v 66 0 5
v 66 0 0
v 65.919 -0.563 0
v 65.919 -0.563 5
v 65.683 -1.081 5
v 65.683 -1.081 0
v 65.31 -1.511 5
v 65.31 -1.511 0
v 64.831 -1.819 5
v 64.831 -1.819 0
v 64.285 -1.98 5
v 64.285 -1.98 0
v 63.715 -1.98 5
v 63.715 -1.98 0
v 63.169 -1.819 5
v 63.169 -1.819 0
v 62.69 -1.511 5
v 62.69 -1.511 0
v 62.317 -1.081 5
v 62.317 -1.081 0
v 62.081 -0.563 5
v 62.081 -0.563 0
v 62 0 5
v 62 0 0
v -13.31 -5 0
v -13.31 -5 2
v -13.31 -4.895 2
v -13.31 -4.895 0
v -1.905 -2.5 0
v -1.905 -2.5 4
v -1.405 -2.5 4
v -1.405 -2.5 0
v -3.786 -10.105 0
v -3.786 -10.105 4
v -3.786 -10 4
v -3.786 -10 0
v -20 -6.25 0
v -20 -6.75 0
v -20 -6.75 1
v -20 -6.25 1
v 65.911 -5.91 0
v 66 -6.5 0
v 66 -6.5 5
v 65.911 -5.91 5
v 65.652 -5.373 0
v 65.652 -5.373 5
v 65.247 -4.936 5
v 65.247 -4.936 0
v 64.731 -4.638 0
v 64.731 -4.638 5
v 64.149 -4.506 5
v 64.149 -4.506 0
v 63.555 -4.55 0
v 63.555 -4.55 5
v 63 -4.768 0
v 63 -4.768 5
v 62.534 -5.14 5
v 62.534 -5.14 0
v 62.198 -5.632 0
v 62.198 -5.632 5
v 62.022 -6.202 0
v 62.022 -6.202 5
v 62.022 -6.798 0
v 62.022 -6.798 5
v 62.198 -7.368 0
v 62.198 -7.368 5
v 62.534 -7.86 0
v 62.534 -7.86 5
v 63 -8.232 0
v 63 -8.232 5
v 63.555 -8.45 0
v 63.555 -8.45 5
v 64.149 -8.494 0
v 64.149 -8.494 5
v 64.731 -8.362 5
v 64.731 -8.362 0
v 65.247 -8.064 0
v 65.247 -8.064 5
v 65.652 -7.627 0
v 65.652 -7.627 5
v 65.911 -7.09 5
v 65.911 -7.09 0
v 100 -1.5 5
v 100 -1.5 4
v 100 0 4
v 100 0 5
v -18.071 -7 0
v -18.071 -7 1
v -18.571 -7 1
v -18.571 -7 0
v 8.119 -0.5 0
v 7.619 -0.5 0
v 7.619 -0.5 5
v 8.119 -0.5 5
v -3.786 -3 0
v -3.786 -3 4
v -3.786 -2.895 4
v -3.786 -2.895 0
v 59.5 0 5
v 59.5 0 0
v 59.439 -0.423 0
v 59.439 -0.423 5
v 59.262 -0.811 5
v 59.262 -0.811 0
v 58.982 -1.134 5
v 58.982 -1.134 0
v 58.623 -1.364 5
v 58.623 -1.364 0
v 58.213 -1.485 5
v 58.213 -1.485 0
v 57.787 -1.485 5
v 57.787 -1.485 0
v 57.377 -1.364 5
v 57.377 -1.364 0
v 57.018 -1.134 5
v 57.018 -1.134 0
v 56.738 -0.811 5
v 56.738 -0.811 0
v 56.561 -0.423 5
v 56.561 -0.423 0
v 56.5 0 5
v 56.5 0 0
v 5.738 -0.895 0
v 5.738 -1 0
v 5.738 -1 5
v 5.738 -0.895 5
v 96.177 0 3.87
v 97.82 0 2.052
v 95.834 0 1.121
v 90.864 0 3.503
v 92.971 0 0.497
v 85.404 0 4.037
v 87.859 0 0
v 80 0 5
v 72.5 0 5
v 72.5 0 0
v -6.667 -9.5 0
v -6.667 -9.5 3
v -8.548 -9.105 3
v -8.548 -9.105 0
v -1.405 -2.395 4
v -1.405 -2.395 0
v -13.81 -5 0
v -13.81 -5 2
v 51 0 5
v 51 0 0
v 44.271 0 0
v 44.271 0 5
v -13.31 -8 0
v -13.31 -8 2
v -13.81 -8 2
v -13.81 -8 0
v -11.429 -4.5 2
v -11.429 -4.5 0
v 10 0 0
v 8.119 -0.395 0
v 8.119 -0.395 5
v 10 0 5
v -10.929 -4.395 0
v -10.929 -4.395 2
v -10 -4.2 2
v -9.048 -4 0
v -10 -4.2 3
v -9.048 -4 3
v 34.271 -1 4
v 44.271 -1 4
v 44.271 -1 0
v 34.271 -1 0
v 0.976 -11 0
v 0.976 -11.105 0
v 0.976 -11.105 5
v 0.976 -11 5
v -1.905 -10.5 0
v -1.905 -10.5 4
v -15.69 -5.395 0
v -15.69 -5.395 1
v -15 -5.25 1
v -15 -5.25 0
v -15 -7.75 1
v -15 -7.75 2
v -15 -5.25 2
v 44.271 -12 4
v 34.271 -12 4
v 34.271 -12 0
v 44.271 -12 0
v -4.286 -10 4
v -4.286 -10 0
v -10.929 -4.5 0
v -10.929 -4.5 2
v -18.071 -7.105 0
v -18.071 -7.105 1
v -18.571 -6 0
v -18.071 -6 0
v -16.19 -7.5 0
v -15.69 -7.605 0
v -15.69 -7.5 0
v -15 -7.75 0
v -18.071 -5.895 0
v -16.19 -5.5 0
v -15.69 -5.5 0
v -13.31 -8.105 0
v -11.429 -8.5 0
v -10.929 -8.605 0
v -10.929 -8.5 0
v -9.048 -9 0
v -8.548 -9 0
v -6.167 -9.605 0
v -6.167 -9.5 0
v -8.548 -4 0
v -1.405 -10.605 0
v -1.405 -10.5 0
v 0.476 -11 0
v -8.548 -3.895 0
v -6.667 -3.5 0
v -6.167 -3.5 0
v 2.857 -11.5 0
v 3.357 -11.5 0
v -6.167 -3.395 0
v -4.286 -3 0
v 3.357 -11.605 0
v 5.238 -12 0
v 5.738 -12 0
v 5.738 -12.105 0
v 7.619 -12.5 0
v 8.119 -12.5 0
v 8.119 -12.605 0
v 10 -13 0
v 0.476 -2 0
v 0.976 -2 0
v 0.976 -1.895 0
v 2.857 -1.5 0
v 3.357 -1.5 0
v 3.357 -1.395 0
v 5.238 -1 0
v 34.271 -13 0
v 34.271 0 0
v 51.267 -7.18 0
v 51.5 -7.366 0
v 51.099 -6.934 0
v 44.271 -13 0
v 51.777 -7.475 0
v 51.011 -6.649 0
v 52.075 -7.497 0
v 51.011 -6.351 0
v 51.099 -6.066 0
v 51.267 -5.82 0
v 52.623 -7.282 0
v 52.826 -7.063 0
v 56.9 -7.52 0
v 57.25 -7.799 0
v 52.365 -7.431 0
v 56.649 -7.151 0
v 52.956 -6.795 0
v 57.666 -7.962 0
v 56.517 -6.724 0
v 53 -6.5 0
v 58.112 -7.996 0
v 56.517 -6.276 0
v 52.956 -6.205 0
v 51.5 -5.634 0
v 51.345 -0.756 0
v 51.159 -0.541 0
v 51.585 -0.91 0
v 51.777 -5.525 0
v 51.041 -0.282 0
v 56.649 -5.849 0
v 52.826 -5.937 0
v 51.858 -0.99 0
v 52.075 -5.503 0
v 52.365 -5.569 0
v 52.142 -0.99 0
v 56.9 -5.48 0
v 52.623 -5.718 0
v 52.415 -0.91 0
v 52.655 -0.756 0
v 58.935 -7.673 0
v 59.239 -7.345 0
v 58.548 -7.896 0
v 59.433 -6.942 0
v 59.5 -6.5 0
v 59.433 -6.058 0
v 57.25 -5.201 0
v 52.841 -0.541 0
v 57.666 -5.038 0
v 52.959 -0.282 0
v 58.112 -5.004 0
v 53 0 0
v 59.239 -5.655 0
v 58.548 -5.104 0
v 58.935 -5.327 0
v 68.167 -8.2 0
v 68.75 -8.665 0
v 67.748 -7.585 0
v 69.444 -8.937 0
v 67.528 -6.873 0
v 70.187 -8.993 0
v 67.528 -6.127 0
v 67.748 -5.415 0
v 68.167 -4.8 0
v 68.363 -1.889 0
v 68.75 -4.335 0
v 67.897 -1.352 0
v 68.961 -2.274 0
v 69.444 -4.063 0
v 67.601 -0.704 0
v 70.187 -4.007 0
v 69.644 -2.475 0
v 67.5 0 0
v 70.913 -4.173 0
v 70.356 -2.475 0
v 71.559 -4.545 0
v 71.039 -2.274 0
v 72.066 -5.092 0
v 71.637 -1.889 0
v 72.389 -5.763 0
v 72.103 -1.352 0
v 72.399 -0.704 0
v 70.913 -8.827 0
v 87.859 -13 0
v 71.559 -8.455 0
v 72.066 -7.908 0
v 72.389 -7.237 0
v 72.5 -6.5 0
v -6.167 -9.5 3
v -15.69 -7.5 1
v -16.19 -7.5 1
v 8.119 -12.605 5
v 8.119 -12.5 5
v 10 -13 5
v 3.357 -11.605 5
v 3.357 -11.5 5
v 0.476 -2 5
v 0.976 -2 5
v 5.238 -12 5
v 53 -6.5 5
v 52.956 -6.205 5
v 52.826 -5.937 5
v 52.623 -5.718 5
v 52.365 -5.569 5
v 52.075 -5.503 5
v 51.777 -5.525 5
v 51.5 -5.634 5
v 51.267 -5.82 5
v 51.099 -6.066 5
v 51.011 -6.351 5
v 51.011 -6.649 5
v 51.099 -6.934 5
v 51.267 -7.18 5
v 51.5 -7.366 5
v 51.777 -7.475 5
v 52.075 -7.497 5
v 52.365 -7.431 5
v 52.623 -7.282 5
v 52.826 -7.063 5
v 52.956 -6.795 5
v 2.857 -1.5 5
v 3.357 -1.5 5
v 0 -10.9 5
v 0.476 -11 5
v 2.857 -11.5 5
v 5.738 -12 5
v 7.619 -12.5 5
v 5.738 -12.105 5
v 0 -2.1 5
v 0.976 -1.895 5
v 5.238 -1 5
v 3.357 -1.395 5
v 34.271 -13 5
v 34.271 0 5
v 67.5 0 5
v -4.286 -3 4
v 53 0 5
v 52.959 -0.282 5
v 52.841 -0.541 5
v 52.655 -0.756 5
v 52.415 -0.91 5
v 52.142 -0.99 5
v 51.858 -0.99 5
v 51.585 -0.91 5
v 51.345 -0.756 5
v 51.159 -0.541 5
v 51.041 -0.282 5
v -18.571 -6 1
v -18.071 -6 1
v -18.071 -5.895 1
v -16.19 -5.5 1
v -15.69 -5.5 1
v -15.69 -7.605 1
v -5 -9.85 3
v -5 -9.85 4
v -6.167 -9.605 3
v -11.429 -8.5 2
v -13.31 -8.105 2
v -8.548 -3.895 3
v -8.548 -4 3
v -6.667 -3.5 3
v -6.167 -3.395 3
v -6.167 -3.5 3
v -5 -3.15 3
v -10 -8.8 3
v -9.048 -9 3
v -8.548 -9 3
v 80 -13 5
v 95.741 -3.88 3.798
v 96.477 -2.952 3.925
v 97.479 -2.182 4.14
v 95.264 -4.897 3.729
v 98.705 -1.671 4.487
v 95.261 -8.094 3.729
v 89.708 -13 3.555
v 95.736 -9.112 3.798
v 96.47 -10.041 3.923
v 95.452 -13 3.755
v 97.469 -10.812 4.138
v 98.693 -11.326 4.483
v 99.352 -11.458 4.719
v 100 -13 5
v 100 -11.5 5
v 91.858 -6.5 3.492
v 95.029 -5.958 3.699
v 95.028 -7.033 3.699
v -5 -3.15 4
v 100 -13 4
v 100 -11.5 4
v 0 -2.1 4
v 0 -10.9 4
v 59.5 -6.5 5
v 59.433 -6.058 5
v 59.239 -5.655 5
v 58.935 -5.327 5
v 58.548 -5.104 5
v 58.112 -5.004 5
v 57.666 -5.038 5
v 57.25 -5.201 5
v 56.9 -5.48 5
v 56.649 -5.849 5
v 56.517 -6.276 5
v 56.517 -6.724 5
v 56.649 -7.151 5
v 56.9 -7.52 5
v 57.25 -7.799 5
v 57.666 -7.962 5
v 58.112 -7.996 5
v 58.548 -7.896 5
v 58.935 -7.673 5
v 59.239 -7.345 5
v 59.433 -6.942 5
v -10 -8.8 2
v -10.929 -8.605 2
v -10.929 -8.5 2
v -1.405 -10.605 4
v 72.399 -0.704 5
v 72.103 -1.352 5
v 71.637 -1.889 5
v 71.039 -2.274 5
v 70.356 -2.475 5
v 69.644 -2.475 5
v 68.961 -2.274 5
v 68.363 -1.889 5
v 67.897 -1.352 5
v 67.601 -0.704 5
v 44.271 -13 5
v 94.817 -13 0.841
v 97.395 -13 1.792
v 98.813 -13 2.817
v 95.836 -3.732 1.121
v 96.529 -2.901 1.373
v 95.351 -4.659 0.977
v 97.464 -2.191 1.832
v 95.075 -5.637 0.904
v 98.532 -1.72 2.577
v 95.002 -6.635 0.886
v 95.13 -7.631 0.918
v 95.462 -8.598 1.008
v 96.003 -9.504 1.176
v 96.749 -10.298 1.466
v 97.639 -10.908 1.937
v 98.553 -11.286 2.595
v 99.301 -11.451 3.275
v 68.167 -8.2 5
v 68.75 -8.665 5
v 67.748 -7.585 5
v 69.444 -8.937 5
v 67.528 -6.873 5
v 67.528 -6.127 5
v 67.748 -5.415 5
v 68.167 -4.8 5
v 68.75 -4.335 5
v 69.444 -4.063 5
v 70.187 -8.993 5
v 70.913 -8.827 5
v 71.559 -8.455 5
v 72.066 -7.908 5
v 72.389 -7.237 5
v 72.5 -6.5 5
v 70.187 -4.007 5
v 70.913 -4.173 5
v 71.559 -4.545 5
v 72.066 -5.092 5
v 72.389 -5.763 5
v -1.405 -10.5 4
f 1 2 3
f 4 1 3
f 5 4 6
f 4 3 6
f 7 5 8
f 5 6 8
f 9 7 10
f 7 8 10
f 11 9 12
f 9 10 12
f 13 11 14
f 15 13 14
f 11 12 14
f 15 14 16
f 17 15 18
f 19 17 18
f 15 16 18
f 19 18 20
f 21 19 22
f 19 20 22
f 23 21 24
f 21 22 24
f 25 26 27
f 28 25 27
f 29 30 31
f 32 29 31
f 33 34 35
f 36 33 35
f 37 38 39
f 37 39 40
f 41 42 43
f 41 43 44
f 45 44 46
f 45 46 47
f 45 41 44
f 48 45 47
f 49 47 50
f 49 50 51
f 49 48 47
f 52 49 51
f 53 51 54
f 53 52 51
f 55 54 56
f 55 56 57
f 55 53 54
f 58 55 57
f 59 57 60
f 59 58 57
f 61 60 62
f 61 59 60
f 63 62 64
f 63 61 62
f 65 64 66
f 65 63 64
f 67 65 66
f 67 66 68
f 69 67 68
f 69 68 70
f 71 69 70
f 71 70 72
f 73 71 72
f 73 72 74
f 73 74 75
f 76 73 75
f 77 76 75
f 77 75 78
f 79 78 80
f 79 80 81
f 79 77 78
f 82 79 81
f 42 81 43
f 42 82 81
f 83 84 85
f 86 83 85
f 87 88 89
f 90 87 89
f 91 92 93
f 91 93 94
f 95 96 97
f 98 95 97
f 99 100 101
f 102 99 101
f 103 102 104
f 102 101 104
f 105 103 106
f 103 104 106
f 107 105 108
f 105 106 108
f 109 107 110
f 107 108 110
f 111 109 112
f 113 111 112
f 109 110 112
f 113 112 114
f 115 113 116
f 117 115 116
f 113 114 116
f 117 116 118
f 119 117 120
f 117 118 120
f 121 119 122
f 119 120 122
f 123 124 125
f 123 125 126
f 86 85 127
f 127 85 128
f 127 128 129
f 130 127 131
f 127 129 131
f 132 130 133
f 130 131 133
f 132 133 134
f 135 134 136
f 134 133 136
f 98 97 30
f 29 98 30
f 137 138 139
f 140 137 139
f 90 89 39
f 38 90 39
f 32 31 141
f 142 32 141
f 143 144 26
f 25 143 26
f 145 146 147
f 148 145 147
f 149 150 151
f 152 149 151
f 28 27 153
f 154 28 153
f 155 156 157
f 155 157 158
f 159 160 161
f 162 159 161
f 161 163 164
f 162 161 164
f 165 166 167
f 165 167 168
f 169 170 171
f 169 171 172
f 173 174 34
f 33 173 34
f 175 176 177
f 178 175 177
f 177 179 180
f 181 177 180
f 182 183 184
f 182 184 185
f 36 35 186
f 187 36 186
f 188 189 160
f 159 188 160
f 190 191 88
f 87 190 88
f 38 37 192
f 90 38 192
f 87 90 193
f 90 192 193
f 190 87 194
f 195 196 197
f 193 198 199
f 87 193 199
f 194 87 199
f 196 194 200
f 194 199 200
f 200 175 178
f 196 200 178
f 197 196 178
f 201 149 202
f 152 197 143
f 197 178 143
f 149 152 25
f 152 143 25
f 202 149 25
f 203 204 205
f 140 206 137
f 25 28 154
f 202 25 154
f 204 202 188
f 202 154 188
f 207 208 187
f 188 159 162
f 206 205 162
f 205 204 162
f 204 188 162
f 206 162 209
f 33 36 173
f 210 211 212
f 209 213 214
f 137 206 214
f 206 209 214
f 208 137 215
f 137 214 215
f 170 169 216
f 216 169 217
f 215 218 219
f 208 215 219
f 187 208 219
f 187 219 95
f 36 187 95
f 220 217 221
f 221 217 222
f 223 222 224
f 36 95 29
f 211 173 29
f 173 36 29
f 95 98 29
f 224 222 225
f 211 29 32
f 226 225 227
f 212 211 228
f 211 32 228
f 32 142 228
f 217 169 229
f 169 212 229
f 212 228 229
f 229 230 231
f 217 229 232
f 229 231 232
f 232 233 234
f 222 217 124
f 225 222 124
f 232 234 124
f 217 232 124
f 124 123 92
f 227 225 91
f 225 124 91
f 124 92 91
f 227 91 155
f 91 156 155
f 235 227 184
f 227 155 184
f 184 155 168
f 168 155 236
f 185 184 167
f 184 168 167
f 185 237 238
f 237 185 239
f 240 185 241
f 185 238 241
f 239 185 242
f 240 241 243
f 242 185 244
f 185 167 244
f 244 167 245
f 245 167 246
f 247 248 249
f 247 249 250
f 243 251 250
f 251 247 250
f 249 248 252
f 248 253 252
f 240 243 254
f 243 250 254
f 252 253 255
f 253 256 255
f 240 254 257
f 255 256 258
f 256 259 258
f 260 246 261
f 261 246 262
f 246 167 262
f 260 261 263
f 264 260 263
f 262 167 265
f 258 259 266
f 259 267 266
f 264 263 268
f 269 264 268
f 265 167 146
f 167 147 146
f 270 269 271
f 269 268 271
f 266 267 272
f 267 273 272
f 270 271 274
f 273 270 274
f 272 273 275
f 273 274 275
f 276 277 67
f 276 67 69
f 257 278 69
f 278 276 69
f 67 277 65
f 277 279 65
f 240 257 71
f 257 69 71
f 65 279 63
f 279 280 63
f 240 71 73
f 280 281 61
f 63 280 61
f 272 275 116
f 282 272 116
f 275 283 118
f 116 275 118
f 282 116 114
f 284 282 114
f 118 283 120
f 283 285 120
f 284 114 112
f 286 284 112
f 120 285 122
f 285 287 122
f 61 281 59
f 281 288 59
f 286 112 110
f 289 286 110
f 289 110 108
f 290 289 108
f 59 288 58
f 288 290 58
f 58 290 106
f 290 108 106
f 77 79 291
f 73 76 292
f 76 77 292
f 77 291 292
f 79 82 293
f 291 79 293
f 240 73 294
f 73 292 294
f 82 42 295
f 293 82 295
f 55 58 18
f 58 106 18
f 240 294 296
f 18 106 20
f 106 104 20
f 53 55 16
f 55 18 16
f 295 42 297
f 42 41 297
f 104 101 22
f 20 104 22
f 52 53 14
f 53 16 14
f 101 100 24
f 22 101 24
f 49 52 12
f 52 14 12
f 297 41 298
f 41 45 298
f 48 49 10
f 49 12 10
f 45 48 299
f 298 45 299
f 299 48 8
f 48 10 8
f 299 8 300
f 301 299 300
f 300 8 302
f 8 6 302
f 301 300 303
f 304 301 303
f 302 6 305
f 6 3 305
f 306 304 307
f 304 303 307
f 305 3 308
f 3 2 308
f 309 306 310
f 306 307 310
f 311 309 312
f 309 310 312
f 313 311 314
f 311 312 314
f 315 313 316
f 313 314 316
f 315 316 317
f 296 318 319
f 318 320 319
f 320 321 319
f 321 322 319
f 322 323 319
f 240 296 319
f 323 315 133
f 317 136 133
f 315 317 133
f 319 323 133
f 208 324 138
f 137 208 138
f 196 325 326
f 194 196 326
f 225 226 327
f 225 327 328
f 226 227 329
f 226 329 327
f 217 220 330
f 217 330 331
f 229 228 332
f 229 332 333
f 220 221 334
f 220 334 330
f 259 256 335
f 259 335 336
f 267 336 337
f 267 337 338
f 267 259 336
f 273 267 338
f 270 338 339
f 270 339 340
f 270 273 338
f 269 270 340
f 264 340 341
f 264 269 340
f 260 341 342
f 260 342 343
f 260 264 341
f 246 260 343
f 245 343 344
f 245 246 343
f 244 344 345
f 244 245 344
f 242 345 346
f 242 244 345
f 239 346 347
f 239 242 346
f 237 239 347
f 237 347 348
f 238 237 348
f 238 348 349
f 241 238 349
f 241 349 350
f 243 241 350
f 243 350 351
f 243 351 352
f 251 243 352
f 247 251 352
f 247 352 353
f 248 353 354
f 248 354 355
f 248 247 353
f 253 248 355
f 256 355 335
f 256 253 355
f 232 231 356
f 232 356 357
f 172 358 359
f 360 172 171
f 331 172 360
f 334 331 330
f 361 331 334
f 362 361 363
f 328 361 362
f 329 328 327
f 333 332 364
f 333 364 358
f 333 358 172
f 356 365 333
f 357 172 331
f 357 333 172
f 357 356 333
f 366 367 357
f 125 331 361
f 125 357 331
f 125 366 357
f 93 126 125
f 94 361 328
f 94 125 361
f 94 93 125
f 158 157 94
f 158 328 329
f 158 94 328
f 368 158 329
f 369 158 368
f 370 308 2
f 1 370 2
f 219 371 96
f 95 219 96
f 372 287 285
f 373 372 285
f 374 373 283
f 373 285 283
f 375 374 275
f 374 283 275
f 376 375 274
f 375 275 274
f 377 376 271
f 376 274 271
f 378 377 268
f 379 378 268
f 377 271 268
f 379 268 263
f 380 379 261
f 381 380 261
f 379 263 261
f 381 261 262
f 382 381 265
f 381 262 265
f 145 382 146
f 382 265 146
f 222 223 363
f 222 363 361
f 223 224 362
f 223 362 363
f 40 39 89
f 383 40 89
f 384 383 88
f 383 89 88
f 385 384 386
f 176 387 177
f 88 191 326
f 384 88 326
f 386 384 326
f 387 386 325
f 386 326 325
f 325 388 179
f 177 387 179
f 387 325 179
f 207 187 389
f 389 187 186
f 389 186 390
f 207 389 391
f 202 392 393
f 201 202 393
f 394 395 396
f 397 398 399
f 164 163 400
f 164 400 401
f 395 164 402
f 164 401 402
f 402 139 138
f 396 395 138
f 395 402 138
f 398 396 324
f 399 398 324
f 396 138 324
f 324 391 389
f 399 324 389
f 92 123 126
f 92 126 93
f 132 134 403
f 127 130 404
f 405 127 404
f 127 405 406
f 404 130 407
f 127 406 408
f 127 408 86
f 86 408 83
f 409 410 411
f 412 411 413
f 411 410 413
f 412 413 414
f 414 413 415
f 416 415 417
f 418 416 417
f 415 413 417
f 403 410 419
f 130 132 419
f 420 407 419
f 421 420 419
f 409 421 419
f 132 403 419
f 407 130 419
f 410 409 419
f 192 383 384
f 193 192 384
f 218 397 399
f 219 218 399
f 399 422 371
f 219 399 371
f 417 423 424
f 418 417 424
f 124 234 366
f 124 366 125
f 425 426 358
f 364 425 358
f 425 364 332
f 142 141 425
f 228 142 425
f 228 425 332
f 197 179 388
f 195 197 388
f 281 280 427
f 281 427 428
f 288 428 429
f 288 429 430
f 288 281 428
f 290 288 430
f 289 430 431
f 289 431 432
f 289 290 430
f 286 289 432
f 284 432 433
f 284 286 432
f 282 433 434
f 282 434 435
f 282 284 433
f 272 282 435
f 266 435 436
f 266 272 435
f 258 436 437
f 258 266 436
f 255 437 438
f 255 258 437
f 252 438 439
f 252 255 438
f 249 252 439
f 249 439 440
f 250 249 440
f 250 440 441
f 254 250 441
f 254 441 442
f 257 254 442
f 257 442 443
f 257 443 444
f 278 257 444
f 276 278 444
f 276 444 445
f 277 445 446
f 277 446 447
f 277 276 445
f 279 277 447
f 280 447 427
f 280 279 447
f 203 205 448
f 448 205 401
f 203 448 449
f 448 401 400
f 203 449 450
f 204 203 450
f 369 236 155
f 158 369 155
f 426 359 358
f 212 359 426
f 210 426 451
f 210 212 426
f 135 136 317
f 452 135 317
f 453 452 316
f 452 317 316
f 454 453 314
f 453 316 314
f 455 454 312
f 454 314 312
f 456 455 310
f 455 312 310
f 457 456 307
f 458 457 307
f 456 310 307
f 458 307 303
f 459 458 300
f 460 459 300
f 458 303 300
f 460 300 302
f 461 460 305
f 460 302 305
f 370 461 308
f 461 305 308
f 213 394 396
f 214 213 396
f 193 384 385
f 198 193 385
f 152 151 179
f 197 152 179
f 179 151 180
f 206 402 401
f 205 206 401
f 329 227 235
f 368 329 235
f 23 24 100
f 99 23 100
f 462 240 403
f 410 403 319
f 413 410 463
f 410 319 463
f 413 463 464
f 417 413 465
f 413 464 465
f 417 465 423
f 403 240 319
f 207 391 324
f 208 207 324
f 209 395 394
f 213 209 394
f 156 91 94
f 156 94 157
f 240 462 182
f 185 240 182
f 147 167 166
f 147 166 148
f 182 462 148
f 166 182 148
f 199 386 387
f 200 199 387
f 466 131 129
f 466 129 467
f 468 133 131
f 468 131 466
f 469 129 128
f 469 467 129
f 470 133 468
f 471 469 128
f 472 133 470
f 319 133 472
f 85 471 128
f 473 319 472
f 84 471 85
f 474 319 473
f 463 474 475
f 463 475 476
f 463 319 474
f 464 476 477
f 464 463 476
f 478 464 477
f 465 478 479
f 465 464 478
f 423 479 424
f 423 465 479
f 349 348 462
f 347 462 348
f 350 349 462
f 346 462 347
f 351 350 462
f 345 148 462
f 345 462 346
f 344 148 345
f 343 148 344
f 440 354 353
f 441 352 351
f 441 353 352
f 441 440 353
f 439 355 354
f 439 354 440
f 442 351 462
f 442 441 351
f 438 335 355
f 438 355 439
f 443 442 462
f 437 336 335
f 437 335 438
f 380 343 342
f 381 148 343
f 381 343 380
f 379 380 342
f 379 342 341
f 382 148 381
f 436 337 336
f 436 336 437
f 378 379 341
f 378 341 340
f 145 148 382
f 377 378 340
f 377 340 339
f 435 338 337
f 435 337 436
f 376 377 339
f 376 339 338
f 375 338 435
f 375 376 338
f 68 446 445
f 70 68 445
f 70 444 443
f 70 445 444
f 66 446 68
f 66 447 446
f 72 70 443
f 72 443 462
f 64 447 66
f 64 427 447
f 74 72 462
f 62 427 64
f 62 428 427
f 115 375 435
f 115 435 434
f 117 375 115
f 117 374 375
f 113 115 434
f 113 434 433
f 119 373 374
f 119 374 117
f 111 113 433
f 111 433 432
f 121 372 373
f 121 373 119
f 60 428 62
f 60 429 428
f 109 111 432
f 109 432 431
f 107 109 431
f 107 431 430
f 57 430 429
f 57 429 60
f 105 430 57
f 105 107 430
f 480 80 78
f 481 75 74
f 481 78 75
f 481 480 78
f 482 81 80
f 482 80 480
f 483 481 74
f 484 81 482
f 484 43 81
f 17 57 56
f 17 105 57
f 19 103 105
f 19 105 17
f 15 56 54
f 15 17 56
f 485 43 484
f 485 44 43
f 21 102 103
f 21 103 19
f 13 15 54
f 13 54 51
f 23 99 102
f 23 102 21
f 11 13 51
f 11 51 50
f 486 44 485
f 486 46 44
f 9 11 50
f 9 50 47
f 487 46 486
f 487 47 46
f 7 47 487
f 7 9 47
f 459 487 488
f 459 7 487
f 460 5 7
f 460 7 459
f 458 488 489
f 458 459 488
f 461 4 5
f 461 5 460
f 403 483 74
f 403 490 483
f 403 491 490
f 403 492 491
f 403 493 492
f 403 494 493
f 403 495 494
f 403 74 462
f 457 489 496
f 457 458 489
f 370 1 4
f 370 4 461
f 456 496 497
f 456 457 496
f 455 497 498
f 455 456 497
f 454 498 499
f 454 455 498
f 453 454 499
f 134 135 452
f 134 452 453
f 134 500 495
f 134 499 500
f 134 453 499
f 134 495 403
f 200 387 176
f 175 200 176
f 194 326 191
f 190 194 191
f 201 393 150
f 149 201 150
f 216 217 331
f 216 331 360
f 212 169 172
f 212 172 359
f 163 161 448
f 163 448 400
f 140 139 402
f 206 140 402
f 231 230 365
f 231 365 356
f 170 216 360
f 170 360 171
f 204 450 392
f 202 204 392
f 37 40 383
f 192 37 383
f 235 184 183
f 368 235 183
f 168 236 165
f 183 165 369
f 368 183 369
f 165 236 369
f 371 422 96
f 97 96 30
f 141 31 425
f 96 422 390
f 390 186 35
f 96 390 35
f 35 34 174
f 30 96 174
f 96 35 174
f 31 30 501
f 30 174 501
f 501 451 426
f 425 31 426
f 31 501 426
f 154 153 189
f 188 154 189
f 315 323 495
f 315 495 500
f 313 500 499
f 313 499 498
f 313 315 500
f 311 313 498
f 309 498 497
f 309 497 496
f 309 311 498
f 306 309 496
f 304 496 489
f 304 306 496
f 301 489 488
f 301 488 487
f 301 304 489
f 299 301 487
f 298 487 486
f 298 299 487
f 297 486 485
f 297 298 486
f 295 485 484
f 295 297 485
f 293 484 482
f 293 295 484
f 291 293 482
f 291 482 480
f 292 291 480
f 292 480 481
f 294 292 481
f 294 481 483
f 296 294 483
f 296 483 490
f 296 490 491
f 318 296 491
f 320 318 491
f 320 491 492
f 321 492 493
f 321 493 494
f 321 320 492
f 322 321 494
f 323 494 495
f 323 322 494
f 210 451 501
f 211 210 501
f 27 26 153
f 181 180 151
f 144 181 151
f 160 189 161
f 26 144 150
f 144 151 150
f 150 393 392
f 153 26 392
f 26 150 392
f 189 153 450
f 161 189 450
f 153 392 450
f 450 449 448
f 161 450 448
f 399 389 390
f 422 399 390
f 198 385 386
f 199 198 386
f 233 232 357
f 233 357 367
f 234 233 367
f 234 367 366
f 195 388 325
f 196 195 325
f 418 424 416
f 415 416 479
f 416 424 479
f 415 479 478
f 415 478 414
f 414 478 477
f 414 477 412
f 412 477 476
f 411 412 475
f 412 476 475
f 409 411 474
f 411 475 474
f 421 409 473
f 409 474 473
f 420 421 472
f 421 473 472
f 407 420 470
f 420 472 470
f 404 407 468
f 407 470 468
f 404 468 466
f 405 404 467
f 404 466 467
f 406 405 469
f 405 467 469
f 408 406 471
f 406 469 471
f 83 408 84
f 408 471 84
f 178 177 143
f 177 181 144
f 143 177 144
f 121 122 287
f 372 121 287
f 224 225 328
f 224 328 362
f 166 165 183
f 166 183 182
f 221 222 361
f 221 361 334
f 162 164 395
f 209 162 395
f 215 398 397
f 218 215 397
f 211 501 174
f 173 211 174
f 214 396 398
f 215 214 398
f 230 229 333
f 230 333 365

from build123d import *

# Parameters (mm, degrees)
F0_R          = 1
F0_R_2        = 1.5
F0_R_3        = 2
F0_R_4        = 2.5
F0_W          = 20
F0_H          = 13
F1_DEPTH      = 5
F2_DEPTH      = 5
F4_DEPTH      = 25
F6_DEPTH      = 25
F6_DEPTH_BACK = 25
F7_W          = 10
F7_H          = 13
F8_DEPTH      = 1
F9_W          = 10
F9_H          = 4
F10_DEPTH     = 1
F11_W         = 10
F11_H         = 4
F12_DEPTH     = 1


with BuildPart() as f1:
    # F0 (on Top) → F1 (new body)
    with BuildSketch(Plane.XY):
        with BuildLine():
            Line((51, 0), (0, 0))
            Line((0, 0), (0, -13))
            Line((0, -13), (80, -13))
            Line((80, -13), (80, 0))
            Line((80, 0), (72.5, 0))
            ThreePointArc((72.5, 0), (70, -2.5), (67.5, 0))
            Line((67.5, 0), (66, 0))
            ThreePointArc((66, 0), (64, -2), (62, 0))
            Line((62, 0), (59.5, 0))
            ThreePointArc((59.5, 0), (58, -1.5), (56.5, 0))
            Line((56.5, 0), (53, 0))
            ThreePointArc((53, 0), (52, -1), (51, 0))
        make_face()
        with Locations((52, -6.5)):
            Circle(F0_R, mode=Mode.SUBTRACT)
        with Locations((58, -6.5)):
            Circle(F0_R_2, mode=Mode.SUBTRACT)
        with Locations((64, -6.5)):
            Circle(F0_R_3, mode=Mode.SUBTRACT)
        with Locations((70, -6.5)):
            Circle(F0_R_4, mode=Mode.SUBTRACT)
        with Locations((-10, -6.5)):
            Rectangle(F0_W, F0_H)
    extrude(amount=F1_DEPTH)

    # F0 (on Top) → F2 (join)
    with BuildSketch(Plane.XY):
        with BuildLine():
            Line((80, 0), (80, -13))
            Line((80, -13), (100, -13))
            Line((100, -13), (100, -11.5))
            ThreePointArc((100, -11.5), (95, -6.5), (100, -1.5))
            Line((100, -1.5), (100, 0))
            Line((100, 0), (80, 0))
        make_face()
    extrude(amount=F2_DEPTH)

    # F3 (on face) → F4 (cut)
    with BuildSketch(Plane.XZ.offset(13)):
        with BuildLine():
            add(Edge.make_bspline(
                [(100, 5), (101.2132067544, 5.5826393103), (101.9557552568, 6.3039713147), (102.6983037591, 7.0253033191)],
                knots=[0.7752257758, 0.7752257758, 0.7752257758, 0.7752257758, 1, 1, 1, 1], degree=3))
            Line((100, 5), (100, 4))
            add(Edge.make_bspline(
                [(100, 4), (100.9116064462, 4.9781336211), (101.8049551027, 6.0017184701), (102.6983037591, 7.0253033191)],
                knots=[0.7146792603, 0.7146792603, 0.7146792603, 0.7146792603, 1, 1, 1, 1], degree=3))
        make_face()
        Polygon((0, 4), (0, 5), (-20, 5), (-20, 1), (-15, 1), (-15, 2), (-10, 2), (-10, 3), (-5, 3), (-5, 4), align=None)
        with BuildLine():
            Line((100, 5), (80, 5))
            add(Edge.make_bspline(
                [(80, 5), (84.0150963882, 4.2328291772), (91.3720317074, 2.8271278998), (98.0993371218, 4.0872117184), (100, 5)],
                knots=[0, 0, 0, 0, 0.4230846239, 0.7752257758, 0.7752257758, 0.7752257758, 0.7752257758], degree=3))
        make_face()
        with BuildLine():
            Line((100, 0), (100, 4))
            add(Edge.make_bspline(
                [(87.8586545587, 0), (91.1531912492, 0.2461096824), (96.7341711942, 0.6630220834), (99.0645185264, 2.9962490008), (100, 4)],
                knots=[0, 0, 0, 0, 0.4218859534, 0.7146792603, 0.7146792603, 0.7146792603, 0.7146792603], degree=3))
            Line((87.8586545587, 0), (100, 0))
        make_face()
    extrude(amount=-F4_DEPTH, mode=Mode.SUBTRACT)

    # F5 (on face) → F6 (cut, two sides)
    with BuildSketch(Plane.XY.offset(1)) as f6_sk:
        Polygon((8.119047619, -0.395), (10, 0), (10, 3.0941735022), (-21.7320173979, 3.0941735022), (-21.7320173979, -15.9472320229), (10, -15.9472320229), (10, -13), (8.119047619, -12.605), (8.119047619, -12.5), (7.619047619, -12.5), (5.7380952381, -12.105), (5.7380952381, -12), (5.2380952381, -12), (3.3571428571, -11.605), (3.3571428571, -11.5), (2.8571428571, -11.5), (0.9761904762, -11.105), (0.9761904762, -11), (0.4761904762, -11), (-1.4047619048, -10.605), (-1.4047619048, -10.5), (-1.9047619048, -10.5), (-3.7857142857, -10.105), (-3.7857142857, -10), (-4.2857142857, -10), (-6.1666666667, -9.605), (-6.1666666667, -9.5), (-6.6666666667, -9.5), (-8.5476190476, -9.105), (-8.5476190476, -9), (-9.0476190476, -9), (-10.9285714286, -8.605), (-10.9285714286, -8.5), (-11.4285714286, -8.5), (-13.3095238095, -8.105), (-13.3095238095, -8), (-13.8095238095, -8), (-15, -7.75), (-15, -13), (-20, -13), (-20, -6.75), (-20, -6.5), (-20, -6.25), (-20, 0), (-15, 0), (-15, -5.25), (-13.8095238095, -5), (-13.3095238095, -5), (-13.3095238095, -4.895), (-11.4285714286, -4.5), (-10.9285714286, -4.5), (-10.9285714286, -4.395), (-9.0476190476, -4), (-8.5476190476, -4), (-8.5476190476, -3.895), (-6.6666666667, -3.5), (-6.1666666667, -3.5), (-6.1666666667, -3.395), (-4.2857142857, -3), (-3.7857142857, -3), (-3.7857142857, -2.895), (-1.9047619048, -2.5), (-1.4047619048, -2.5), (-1.4047619048, -2.395), (0.4761904762, -2), (0.9761904762, -2), (0.9761904762, -1.895), (2.8571428571, -1.5), (3.3571428571, -1.5), (3.3571428571, -1.395), (5.2380952381, -1), (5.7380952381, -1), (5.7380952381, -0.895), (7.619047619, -0.5), (8.119047619, -0.5), align=None)
        Polygon((-15.6904761905, -5.395), (-15, -5.25), (-15, 0), (-20, 0), (-20, -6.25), (-18.5714285714, -6), (-18.0714285714, -6), (-18.0714285714, -5.895), (-16.1904761905, -5.5), (-15.6904761905, -5.5), align=None)
        Polygon((-15, -13), (-15, -7.75), (-15.6904761905, -7.605), (-15.6904761905, -7.5), (-16.1904761905, -7.5), (-18.0714285714, -7.105), (-18.0714285714, -7), (-18.5714285714, -7), (-20, -6.75), (-20, -13), align=None)
    extrude(amount=-F6_DEPTH, mode=Mode.SUBTRACT)
    extrude(f6_sk.sketch, amount=F6_DEPTH_BACK, mode=Mode.SUBTRACT)

    # F7 (on face) → F8 (cut)
    with BuildSketch(Plane.XY.offset(5)):
        with Locations((39.2707522213, -6.5)):
            Rectangle(F7_W, F7_H)
    extrude(amount=-F8_DEPTH, mode=Mode.SUBTRACT)

    # F9 (on face) → F10 (cut)
    with BuildSketch(Plane.XZ.offset(13)):
        with Locations((39.2707522213, 2)):
            Rectangle(F9_W, F9_H)
    extrude(amount=-F10_DEPTH, mode=Mode.SUBTRACT)

    # F11 (on face) → F12 (cut)
    with BuildSketch(Plane(origin=(0, 0, 0), x_dir=(-1, 0, 0), z_dir=(0, 1, 0))):
        with Locations((-39.2707522213, 2)):
            Rectangle(F11_W, F11_H)
    extrude(amount=-F12_DEPTH, mode=Mode.SUBTRACT)


solid = f1.part
